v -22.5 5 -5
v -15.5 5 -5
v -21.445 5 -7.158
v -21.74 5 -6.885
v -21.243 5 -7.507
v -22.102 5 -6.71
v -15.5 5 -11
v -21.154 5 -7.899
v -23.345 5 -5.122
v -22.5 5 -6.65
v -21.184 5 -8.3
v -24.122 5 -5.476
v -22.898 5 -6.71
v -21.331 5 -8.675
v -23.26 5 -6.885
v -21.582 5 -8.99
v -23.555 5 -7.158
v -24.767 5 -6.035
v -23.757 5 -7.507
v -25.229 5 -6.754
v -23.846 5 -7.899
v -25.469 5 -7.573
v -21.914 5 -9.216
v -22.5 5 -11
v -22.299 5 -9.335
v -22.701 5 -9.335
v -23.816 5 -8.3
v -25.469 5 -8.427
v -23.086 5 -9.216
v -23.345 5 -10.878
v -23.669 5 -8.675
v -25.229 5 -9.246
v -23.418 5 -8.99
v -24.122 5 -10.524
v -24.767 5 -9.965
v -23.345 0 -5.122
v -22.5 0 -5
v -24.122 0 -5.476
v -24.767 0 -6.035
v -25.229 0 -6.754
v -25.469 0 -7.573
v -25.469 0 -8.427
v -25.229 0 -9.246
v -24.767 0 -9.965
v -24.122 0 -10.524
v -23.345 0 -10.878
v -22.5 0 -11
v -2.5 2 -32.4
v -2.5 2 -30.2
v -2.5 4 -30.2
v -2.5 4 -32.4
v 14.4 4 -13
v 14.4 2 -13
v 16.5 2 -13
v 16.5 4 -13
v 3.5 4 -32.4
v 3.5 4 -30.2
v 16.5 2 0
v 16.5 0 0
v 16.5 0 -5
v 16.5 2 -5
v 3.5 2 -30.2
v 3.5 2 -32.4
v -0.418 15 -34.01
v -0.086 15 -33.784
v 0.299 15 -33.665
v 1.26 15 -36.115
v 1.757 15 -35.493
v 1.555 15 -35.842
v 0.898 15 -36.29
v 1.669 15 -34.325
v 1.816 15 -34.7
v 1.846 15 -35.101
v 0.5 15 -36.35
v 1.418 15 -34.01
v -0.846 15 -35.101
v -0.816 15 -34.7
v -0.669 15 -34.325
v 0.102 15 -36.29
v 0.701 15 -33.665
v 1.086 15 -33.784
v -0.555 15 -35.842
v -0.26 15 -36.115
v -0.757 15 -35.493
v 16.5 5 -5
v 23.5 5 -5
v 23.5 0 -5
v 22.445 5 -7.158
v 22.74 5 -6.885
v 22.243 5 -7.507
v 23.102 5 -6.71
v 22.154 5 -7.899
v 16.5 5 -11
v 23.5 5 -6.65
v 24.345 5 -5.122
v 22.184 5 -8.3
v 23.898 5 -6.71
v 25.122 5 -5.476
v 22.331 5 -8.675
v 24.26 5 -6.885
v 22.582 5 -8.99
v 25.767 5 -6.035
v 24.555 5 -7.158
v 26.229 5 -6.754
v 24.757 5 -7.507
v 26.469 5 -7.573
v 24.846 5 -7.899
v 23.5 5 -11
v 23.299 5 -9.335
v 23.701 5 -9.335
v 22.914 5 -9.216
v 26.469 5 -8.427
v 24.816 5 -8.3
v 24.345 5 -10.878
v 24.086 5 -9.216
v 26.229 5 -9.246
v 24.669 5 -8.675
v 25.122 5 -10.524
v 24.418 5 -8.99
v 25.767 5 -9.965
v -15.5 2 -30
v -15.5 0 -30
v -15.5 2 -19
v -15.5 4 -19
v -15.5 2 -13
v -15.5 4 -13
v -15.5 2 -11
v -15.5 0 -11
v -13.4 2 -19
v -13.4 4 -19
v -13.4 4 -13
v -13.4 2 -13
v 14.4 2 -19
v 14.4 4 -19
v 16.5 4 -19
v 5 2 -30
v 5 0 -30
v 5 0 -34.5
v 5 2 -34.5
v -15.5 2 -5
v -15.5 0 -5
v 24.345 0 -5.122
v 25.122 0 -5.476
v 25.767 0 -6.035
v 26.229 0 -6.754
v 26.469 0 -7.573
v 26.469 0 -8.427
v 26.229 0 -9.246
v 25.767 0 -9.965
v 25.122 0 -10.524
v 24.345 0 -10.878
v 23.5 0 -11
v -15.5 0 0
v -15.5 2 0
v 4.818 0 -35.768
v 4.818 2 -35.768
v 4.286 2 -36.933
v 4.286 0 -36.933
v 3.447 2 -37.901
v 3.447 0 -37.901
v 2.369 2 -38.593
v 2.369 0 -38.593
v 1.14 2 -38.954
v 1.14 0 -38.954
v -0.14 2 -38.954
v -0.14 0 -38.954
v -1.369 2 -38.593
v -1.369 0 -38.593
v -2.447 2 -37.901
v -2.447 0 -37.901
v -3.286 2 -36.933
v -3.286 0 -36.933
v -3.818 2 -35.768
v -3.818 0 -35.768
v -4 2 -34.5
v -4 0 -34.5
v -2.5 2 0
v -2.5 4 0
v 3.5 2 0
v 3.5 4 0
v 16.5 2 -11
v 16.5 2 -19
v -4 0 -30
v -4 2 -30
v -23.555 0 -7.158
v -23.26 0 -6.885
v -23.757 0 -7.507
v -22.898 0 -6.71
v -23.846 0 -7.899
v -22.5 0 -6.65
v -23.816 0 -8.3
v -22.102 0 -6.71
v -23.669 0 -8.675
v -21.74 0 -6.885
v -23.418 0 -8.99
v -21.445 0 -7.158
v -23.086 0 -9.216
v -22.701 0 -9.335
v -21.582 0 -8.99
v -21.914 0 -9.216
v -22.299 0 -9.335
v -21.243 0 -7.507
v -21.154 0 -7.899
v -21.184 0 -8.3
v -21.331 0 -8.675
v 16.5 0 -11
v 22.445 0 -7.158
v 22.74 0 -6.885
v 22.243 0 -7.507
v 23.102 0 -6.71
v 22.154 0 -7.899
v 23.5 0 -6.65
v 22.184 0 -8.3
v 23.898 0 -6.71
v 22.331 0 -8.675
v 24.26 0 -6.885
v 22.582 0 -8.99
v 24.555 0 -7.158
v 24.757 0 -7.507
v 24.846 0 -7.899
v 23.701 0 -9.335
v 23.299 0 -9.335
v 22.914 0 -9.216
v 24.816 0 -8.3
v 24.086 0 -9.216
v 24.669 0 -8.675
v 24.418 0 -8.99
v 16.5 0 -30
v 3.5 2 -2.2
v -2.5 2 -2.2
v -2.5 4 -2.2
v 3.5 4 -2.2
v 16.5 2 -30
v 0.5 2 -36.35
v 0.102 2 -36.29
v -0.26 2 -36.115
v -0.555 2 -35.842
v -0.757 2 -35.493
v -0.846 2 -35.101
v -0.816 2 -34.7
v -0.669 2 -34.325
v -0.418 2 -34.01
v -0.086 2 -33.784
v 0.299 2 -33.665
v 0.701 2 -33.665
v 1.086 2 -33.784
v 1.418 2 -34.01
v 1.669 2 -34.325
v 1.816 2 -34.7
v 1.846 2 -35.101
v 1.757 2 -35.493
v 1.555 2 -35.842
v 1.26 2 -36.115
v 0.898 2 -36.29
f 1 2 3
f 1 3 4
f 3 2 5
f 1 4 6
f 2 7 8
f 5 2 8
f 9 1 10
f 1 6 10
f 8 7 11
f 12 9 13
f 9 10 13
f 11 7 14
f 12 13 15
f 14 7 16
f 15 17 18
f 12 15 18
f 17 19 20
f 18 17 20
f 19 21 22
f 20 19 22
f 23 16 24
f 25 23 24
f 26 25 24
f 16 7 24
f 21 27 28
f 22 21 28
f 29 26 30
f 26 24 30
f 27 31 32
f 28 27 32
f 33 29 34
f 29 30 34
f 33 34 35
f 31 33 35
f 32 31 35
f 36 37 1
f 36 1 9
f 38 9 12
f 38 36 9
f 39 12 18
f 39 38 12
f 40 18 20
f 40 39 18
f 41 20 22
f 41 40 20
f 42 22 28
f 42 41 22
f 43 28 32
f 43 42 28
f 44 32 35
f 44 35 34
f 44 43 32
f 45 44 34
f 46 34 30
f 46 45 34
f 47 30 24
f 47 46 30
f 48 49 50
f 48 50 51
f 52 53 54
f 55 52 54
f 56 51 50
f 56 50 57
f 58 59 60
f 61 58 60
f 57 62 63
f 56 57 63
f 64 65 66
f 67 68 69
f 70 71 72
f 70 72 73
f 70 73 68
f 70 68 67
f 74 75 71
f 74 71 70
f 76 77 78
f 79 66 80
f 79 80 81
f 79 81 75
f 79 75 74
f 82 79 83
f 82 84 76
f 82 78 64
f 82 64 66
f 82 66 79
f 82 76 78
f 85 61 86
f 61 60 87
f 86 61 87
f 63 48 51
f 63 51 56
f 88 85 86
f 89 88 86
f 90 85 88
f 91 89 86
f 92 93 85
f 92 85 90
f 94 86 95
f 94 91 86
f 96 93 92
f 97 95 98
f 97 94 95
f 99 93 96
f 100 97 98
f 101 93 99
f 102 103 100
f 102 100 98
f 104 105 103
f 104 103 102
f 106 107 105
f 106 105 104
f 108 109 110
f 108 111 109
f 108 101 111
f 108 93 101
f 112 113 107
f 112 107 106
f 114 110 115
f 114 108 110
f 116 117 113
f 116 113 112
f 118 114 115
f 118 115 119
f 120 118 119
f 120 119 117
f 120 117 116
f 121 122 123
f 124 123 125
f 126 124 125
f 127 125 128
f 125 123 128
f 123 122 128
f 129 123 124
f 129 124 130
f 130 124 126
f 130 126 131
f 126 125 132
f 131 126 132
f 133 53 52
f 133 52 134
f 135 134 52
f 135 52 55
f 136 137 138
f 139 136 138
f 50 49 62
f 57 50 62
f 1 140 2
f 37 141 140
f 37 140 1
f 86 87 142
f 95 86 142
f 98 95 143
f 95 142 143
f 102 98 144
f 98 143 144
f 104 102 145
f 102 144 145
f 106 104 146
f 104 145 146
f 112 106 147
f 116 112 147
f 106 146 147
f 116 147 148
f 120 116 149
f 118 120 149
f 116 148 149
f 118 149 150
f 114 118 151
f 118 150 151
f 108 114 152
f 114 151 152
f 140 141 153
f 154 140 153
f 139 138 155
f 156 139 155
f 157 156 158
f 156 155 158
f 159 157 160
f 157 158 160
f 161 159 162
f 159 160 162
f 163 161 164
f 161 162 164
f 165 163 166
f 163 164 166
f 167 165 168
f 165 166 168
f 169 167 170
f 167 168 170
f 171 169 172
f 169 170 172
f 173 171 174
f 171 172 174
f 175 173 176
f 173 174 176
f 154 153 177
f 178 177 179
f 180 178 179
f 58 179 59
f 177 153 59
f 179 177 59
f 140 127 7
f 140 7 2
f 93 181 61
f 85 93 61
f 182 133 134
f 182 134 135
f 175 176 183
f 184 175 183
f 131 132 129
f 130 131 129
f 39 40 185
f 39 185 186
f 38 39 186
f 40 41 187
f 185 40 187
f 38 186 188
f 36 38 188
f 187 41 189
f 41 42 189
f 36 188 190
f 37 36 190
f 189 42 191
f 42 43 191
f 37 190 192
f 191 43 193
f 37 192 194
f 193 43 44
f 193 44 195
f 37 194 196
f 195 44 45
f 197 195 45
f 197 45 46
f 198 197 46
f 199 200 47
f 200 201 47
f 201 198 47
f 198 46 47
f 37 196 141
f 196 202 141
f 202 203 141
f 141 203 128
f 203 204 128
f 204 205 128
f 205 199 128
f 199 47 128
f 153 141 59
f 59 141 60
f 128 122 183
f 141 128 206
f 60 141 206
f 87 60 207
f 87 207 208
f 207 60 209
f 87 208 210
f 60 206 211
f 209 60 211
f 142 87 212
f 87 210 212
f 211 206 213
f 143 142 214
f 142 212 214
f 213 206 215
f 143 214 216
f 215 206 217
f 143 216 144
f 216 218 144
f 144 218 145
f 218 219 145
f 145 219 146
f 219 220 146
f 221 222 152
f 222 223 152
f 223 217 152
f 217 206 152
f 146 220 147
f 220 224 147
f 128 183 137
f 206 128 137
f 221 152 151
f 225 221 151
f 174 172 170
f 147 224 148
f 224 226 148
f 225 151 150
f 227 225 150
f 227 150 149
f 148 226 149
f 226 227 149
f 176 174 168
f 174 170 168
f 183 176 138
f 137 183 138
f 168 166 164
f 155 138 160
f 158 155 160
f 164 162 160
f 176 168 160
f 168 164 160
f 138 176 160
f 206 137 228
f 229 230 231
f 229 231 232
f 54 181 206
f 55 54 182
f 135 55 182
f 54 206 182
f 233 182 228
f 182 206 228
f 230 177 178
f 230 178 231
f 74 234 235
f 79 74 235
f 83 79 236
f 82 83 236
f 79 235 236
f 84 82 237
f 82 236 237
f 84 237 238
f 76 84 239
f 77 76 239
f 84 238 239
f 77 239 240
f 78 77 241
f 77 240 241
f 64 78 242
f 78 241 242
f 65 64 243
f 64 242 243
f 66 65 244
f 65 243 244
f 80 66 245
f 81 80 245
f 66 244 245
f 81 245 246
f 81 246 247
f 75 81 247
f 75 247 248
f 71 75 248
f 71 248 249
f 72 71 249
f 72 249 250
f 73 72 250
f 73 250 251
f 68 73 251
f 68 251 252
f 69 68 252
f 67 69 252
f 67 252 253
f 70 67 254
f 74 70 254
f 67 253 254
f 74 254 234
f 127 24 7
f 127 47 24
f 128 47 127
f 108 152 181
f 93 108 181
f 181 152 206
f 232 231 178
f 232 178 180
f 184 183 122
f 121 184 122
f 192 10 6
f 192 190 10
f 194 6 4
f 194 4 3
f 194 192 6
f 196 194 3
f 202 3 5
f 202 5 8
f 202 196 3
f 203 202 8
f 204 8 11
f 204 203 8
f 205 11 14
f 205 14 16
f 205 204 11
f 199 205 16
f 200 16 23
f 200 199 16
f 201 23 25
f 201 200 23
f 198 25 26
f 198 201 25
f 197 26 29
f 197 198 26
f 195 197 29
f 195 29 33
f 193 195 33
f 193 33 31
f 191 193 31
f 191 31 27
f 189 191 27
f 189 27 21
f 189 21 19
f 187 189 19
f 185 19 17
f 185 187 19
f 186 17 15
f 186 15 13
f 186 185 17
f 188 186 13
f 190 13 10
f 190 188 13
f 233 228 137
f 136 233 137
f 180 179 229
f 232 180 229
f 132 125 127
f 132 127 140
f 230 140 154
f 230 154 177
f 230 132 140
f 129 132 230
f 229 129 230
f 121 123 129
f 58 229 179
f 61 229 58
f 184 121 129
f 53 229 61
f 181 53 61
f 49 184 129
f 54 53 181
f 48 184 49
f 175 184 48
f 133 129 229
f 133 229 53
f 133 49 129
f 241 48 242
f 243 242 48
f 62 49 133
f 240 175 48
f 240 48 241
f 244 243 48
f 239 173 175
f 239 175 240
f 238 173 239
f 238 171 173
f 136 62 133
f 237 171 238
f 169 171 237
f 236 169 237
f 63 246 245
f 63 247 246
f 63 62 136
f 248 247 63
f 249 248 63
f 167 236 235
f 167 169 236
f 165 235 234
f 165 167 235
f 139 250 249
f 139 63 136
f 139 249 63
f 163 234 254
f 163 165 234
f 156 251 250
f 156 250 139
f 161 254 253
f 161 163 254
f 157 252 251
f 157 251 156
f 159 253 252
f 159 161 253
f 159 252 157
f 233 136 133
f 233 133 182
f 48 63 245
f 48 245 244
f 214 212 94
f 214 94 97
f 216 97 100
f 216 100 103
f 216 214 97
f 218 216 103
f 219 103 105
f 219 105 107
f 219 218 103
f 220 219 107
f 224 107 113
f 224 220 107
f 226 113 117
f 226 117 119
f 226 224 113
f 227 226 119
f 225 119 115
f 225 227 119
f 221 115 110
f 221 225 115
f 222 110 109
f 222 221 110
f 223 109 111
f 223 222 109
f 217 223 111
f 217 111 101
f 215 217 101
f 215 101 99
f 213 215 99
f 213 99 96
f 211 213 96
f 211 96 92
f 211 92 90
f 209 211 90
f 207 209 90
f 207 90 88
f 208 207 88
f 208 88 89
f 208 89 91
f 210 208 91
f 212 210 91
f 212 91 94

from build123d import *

# Parameters (mm, degrees)
SKETCH1_R           = 1.35
BOSS_EXTRUDE2_DEPTH = 2
SKETCH3_R           = 1.35
BOSS_EXTRUDE3_DEPTH = 13
SKETCH5_R           = 1.35
BOSS_EXTRUDE4_DEPTH = 3
SKETCH6_W           = 6
SKETCH6_H           = 2.2
SKETCH6_W_2         = 2.1
SKETCH6_H_2         = 6
BOSS_EXTRUDE5_DEPTH = 4


with BuildPart() as part:
    # Sketch1 → Boss-Extrude2 (new body)
    with BuildSketch(Plane(origin=(0, 0, 0), x_dir=(1, 0, 0), z_dir=(0, 1, 0))):
        with BuildLine():
            Line((-15.5, 30), (-15.5, 11))
            Line((-15.5, 11), (-22.5, 11))
            ThreePointArc((-22.5, 11), (-25.5, 8), (-22.5, 5))
            Line((-22.5, 5), (-15.5, 5))
            Line((-15.5, 5), (-15.5, 0))
            Line((-15.5, 0), (16.5, 0))
            Line((16.5, 0), (16.5, 5))
            Line((16.5, 5), (23.5, 5))
            ThreePointArc((23.5, 5), (26.5, 8), (23.5, 11))
            Line((23.5, 11), (16.5, 11))
            Line((16.5, 11), (16.5, 30))
            Line((16.5, 30), (5, 30))
            Line((5, 30), (5, 34.5))
            ThreePointArc((5, 34.5), (0.5, 39), (-4, 34.5))
            Line((-4, 34.5), (-4, 30))
            Line((-4, 30), (-15.5, 30))
        make_face()
        with Locations(Location((-22.5, 8, 0), (0, 0, 270))):
            Circle(SKETCH1_R, mode=Mode.SUBTRACT)
        with Locations(Location((23.5, 8, 0), (0, 0, 270))):
            Circle(SKETCH1_R, mode=Mode.SUBTRACT)
    extrude(amount=BOSS_EXTRUDE2_DEPTH)

    # Sketch3 → Boss-Extrude3 (add)
    with BuildSketch(Plane(origin=(0, 2, 0), x_dir=(1, 0, 0), z_dir=(0, 1, 0))):
        with Locations(Location((0.5, 35, 0), (0, 0, 90))):
            Circle(SKETCH3_R)
    extrude(amount=BOSS_EXTRUDE3_DEPTH)

    # Sketch5 → Boss-Extrude4 (add)
    # profile 1 of 2: a face of its own
    with BuildSketch(Plane(origin=(0, 2, 0), x_dir=(1, 0, 0), z_dir=(0, 1, 0))):
        with BuildLine():
            Line((-15.5, 11), (-15.5, 5))
            Line((-15.5, 5), (-22.5, 5))
            ThreePointArc((-22.5, 5), (-25.5, 8), (-22.5, 11))
            Line((-22.5, 11), (-15.5, 11))
        make_face()
        with Locations(Location((-22.5, 8, 0), (0, 0, 270))):
            Circle(SKETCH5_R, mode=Mode.SUBTRACT)
    # profile 2 of 2: a face of its own
    with BuildSketch(Plane(origin=(0, 2, 0), x_dir=(1, 0, 0), z_dir=(0, 1, 0))):
        with BuildLine():
            Line((16.5, 11), (16.5, 5))
            Line((16.5, 5), (23.5, 5))
            ThreePointArc((23.5, 5), (26.5, 8), (23.5, 11))
            Line((23.5, 11), (16.5, 11))
        make_face()
        with Locations(Location((23.5, 8, 0), (0, 0, 270))):
            Circle(SKETCH5_R, mode=Mode.SUBTRACT)
    extrude(amount=BOSS_EXTRUDE4_DEPTH)

    # Sketch6 → Boss-Extrude5 (add)
    with BuildSketch(Plane(origin=(0, 0, 0), x_dir=(1, 0, 0), z_dir=(0, 1, 0))):
        with Locations((0.5, 1.1)):
            Rectangle(SKETCH6_W, SKETCH6_H)
        with Locations((-14.45, 16)):
            Rectangle(SKETCH6_W_2, SKETCH6_H_2)
        with Locations((15.45, 16)):
            Rectangle(SKETCH6_W_2, SKETCH6_H_2)
        with Locations((0.5, 31.3)):
            Rectangle(SKETCH6_W, SKETCH6_H)
    extrude(amount=BOSS_EXTRUDE5_DEPTH)


solid = part.part
